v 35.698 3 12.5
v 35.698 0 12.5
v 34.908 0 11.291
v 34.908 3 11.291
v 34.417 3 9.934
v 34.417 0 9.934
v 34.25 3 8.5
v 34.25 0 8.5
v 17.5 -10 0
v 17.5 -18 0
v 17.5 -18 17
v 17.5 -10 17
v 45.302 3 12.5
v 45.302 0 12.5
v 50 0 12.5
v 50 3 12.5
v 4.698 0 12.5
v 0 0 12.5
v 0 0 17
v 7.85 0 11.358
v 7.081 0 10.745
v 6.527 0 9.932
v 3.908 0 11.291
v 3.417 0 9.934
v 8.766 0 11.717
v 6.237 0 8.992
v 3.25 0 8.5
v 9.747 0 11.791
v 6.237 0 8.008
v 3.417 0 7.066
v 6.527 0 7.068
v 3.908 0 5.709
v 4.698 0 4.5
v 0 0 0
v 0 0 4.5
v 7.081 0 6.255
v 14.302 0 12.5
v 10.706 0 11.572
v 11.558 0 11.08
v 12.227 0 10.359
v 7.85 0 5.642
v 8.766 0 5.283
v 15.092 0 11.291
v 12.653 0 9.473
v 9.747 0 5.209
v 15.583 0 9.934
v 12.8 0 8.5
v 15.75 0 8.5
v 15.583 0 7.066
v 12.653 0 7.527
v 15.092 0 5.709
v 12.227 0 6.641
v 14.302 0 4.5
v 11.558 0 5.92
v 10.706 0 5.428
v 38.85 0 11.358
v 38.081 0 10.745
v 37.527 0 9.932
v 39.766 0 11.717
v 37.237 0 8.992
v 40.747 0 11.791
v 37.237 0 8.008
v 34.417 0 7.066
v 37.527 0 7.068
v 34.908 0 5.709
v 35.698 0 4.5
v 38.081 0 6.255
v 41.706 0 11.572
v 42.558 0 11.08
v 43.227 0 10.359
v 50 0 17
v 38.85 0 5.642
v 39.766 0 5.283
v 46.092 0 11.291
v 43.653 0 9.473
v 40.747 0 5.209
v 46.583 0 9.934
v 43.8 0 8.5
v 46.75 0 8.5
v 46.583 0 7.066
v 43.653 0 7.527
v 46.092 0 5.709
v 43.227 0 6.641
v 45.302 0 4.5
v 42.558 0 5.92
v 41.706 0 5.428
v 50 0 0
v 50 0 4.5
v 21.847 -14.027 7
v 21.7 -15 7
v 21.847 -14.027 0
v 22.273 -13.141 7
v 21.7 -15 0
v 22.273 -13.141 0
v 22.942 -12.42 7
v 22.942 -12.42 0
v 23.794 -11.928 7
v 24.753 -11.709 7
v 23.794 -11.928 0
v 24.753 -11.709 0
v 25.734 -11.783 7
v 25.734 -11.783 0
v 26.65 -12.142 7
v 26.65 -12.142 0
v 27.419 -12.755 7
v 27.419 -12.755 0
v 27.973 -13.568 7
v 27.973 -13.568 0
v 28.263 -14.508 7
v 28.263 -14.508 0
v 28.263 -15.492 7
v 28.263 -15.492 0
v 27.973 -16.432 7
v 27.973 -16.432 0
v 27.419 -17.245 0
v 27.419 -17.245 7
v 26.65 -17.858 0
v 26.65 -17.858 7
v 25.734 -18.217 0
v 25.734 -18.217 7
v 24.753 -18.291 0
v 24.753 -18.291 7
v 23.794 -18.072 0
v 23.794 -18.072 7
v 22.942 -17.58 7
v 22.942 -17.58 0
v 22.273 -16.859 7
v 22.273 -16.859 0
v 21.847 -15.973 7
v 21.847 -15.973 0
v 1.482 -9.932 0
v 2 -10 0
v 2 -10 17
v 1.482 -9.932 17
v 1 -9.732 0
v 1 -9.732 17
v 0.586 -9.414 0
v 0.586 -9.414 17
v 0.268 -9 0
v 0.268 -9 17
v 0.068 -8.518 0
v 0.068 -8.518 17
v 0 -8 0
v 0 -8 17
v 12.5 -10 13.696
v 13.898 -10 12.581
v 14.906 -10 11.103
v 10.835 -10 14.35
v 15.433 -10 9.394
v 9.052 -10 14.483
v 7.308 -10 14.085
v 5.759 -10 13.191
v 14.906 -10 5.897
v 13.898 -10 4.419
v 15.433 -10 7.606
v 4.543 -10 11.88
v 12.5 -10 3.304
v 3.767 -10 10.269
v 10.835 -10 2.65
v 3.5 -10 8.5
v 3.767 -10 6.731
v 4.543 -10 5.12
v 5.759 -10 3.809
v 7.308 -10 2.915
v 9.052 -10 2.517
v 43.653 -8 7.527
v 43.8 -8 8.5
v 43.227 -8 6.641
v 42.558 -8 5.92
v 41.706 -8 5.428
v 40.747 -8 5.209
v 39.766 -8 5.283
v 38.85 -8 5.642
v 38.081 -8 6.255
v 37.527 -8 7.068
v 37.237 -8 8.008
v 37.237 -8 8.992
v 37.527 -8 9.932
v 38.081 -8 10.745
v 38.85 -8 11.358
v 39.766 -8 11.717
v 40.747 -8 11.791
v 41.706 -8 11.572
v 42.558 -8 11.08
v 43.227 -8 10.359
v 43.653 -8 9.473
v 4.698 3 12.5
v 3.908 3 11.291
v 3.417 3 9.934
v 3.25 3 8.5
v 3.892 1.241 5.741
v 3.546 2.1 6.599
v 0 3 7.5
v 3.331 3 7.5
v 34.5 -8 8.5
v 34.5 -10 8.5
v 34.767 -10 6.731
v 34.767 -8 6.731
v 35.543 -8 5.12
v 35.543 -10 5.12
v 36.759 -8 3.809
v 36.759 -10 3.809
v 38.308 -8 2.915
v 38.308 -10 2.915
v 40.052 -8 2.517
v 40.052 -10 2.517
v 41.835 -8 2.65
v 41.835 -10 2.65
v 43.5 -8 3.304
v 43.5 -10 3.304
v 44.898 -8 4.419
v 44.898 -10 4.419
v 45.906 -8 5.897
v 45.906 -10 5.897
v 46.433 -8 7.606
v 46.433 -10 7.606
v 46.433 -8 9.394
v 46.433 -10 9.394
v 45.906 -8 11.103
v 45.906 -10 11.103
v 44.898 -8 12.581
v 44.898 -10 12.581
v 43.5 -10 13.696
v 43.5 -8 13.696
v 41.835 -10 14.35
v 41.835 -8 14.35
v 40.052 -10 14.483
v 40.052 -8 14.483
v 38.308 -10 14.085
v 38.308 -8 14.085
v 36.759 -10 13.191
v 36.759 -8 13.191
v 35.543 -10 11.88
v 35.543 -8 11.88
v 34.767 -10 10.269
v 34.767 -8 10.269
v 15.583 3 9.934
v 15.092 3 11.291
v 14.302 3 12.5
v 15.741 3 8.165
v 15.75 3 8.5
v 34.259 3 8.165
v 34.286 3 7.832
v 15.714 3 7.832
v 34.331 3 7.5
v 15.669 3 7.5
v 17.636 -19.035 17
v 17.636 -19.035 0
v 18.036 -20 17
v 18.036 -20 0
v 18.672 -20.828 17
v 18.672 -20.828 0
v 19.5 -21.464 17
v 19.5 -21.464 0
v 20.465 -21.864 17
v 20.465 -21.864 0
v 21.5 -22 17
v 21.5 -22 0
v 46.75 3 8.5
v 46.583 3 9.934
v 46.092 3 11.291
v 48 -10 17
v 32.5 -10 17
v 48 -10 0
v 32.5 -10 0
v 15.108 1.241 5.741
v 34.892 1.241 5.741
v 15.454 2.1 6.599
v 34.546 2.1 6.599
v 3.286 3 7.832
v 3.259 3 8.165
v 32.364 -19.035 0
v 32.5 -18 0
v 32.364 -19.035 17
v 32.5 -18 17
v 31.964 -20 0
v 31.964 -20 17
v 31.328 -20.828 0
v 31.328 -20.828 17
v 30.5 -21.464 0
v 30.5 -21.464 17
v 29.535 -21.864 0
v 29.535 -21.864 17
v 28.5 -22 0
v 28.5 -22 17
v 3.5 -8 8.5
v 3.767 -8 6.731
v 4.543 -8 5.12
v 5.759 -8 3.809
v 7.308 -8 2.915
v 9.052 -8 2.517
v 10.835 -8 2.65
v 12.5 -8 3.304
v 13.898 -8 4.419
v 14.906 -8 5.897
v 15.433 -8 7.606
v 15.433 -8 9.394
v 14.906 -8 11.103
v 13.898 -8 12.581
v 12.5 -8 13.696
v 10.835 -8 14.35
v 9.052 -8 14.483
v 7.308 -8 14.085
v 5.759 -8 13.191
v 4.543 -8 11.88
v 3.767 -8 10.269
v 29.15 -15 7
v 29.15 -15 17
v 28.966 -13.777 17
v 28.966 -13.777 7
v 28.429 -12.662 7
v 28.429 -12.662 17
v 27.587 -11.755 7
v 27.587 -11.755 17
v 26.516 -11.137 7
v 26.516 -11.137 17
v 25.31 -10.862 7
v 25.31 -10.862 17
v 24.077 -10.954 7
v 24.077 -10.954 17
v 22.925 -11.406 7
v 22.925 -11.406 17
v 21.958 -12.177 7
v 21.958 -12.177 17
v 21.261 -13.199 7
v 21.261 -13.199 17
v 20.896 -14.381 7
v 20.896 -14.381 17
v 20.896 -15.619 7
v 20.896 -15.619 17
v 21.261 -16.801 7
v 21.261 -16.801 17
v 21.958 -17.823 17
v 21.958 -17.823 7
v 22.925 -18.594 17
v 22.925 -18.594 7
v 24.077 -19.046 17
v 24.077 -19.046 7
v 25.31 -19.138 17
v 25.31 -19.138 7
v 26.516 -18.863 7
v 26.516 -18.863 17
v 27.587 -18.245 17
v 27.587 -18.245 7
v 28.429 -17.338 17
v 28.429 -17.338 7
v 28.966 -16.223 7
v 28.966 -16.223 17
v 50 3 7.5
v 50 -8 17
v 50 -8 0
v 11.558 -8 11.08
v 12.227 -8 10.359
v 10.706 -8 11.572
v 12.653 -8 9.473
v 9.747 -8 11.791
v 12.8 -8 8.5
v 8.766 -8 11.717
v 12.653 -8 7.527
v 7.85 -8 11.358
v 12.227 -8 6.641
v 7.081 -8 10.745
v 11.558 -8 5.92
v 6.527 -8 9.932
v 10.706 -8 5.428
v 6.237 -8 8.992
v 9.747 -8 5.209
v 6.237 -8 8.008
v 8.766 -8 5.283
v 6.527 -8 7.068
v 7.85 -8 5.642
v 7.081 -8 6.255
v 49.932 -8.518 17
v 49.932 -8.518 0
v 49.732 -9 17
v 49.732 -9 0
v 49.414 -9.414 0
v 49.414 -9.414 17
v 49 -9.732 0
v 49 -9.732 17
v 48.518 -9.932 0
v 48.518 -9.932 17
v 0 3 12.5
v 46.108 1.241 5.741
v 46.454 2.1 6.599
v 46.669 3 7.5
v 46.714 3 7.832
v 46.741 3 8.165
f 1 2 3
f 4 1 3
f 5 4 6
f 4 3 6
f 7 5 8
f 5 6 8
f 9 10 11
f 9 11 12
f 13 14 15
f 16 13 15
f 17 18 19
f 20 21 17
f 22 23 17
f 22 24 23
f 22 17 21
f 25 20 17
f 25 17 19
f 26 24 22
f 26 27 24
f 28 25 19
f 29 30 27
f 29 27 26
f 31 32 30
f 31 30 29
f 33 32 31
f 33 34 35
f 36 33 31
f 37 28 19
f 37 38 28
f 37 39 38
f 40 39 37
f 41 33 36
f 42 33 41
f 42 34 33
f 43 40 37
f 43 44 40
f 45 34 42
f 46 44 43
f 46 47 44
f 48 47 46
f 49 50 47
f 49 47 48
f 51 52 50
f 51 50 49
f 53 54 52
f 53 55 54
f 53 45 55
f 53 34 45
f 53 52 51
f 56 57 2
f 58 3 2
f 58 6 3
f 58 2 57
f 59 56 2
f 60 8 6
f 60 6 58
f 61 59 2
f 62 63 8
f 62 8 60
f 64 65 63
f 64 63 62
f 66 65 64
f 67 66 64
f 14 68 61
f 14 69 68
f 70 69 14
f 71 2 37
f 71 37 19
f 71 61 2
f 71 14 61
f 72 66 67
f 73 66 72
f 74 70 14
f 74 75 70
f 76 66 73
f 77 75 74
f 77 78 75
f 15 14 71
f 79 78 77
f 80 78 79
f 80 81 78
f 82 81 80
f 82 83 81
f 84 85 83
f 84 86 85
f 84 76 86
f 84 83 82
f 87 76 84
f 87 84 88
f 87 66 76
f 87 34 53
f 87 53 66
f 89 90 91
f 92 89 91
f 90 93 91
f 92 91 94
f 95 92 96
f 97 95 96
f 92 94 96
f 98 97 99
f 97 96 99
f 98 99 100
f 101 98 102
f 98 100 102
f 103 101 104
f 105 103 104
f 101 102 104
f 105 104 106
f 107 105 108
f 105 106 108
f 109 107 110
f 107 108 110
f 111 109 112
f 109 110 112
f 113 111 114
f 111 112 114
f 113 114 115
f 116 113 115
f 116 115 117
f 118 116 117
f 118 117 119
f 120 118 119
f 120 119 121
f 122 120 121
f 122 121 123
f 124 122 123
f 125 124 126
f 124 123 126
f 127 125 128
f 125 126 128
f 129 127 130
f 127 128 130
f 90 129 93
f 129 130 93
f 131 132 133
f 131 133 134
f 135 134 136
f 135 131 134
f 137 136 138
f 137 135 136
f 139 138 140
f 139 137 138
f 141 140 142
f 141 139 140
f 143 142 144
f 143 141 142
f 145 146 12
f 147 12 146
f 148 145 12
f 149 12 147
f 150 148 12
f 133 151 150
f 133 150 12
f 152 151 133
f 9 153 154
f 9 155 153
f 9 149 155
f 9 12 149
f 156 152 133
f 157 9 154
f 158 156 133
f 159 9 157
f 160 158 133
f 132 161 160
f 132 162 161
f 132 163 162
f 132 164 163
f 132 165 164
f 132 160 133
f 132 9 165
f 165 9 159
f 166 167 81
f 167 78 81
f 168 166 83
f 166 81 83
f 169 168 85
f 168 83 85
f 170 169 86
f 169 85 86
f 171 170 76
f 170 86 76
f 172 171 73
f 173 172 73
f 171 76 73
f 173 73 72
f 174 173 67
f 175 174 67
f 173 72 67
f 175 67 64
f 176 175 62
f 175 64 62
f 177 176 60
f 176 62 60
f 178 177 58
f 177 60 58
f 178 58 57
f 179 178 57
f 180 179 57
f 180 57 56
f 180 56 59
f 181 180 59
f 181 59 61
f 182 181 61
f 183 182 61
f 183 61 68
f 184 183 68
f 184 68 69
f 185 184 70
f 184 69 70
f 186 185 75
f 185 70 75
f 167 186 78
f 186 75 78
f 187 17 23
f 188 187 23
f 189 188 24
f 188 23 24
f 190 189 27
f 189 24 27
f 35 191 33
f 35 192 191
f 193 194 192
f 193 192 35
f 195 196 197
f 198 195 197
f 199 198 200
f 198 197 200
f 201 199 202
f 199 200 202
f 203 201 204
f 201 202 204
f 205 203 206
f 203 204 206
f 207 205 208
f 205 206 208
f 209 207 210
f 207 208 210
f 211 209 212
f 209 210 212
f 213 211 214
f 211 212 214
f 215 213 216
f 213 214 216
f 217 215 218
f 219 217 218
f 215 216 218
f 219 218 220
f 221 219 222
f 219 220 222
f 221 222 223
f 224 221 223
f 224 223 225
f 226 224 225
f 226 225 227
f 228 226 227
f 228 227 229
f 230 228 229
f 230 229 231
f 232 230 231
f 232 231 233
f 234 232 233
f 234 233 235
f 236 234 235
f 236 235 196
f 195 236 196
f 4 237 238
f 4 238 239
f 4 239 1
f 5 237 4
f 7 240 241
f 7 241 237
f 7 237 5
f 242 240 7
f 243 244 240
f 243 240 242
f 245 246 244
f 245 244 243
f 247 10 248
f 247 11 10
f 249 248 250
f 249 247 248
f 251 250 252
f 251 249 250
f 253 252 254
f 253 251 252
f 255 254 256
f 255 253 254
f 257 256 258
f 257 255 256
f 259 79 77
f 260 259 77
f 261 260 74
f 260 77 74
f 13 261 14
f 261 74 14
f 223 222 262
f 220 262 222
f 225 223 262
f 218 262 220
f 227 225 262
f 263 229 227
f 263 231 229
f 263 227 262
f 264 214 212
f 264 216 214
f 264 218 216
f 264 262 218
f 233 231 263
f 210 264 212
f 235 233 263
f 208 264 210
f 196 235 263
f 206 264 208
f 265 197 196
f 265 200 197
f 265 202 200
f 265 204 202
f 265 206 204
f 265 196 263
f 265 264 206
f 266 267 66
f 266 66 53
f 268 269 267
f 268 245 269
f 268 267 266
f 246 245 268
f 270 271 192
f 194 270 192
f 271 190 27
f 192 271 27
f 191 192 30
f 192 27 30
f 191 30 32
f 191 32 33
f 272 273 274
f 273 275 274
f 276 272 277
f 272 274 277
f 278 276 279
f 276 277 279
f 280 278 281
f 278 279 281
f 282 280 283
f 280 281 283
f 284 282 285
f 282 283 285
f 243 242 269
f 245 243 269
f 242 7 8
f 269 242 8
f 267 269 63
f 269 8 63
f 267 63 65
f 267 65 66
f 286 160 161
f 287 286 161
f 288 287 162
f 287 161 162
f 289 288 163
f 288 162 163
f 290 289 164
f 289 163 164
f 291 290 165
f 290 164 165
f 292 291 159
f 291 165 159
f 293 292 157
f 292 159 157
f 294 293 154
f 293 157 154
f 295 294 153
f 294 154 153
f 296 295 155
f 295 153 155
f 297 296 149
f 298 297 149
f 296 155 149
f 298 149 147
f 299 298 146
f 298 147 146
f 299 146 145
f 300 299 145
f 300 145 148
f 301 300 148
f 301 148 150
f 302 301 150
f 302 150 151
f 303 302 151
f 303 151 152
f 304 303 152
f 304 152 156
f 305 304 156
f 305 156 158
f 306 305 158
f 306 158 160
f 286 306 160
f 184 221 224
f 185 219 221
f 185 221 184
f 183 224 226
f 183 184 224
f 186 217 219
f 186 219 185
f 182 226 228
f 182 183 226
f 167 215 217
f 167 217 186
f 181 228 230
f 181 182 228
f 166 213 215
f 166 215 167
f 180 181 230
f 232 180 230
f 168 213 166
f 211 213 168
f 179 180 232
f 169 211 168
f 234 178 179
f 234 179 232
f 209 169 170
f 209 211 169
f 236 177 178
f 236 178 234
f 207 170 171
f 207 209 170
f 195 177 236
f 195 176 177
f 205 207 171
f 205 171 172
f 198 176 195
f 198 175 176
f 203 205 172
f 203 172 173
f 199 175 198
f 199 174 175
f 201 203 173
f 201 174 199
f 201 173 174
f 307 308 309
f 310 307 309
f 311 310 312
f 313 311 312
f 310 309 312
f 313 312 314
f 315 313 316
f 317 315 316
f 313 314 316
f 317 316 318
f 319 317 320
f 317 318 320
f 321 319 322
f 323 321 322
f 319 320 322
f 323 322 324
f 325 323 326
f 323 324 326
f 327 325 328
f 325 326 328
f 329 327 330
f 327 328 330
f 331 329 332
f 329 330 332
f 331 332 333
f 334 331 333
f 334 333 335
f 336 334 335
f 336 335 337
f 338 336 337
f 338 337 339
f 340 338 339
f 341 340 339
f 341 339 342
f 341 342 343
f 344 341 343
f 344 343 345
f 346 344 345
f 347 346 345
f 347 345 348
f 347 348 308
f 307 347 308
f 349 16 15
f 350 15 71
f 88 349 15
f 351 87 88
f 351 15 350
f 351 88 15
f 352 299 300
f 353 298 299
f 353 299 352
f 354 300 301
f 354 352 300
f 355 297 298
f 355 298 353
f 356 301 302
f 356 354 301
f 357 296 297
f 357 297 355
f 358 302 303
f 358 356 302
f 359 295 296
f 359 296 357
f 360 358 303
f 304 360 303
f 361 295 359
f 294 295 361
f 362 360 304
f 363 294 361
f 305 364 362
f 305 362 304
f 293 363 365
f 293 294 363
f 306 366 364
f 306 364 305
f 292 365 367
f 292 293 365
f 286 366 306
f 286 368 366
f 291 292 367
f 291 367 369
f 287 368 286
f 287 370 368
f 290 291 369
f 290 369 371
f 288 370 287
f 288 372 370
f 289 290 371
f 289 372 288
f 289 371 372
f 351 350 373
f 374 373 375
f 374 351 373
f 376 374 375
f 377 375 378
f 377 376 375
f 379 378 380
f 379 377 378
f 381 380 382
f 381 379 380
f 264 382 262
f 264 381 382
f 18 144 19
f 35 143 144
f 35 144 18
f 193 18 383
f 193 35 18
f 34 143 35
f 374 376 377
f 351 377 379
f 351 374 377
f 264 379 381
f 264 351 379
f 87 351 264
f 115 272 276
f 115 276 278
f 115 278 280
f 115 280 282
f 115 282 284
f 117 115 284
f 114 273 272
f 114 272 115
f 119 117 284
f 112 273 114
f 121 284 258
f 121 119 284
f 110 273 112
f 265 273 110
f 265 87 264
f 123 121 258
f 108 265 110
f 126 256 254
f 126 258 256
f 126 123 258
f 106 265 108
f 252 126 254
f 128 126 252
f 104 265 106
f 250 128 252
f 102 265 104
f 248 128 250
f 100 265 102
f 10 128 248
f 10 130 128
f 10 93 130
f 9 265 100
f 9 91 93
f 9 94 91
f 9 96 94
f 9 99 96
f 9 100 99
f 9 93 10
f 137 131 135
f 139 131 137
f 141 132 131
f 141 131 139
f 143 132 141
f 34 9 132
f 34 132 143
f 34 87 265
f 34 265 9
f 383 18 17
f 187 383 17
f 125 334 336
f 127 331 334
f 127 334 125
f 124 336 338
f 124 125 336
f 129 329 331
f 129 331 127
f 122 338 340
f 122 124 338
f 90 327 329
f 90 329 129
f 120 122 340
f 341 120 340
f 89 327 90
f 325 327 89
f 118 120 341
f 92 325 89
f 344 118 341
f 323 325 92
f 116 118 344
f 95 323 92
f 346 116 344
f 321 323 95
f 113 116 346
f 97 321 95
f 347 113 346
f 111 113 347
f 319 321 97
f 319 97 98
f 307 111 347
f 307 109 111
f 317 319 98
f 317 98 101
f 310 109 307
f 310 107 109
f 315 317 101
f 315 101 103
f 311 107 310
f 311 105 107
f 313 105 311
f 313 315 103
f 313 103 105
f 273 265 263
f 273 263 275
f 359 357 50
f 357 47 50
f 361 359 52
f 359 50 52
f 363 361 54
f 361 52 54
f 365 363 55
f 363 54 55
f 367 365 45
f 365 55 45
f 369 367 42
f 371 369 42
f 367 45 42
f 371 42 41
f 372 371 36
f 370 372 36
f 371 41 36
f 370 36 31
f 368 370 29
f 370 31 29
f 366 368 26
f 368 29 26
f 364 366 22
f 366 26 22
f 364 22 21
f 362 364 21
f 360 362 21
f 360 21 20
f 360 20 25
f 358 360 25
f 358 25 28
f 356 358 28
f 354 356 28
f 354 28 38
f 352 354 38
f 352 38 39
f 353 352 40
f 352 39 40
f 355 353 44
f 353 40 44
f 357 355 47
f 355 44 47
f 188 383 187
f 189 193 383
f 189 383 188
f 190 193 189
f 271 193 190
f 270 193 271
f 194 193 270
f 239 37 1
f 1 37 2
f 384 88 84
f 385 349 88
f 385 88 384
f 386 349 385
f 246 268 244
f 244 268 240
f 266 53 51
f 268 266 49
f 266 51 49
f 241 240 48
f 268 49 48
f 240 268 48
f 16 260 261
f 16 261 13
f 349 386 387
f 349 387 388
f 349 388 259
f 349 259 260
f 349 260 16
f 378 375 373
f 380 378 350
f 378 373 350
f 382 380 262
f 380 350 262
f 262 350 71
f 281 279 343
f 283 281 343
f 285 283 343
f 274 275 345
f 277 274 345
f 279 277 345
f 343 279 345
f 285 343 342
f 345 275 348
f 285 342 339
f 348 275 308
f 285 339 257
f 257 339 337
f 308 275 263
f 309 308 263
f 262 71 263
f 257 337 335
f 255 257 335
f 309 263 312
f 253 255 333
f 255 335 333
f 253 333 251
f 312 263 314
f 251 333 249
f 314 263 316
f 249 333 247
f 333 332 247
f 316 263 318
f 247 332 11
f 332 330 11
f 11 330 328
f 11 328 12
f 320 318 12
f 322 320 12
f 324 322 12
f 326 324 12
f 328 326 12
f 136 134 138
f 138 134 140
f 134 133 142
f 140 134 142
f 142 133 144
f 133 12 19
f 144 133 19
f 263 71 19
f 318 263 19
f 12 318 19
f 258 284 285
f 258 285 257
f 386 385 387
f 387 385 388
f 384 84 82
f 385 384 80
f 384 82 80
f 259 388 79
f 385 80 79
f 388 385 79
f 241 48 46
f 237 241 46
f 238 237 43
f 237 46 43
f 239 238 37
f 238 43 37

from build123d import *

# Parameters (mm, degrees)
P_IDAT_VYSUNUT_M1_DEPTH                           = 17
V_LCOV_ZAHLOUBEN_PRO_M6_ROUBY_S_HLAVO_D           = 6.6
V_LCOV_ZAHLOUBEN_PRO_M6_ROUBY_S_HLAVO_CBORE_D     = 8.3
V_LCOV_ZAHLOUBEN_PRO_M6_ROUBY_S_HLAVO_CBORE_DEPTH = 10
V_LCOV_ZAHLOUBEN_PRO_M6_ROUBY_S_H_2_D             = 6.6
V_LCOV_ZAHLOUBEN_PRO_M6_ROUBY_S_H_2_CBORE_D       = 12
V_LCOV_ZAHLOUBEN_PRO_M6_ROUBY_S_H_2_CBORE_DEPTH   = 2
ZAOBLIT1_R                                        = 4
P_IDAT_VYSUNUT_M4_DEPTH                           = 3
ZKOSEN_1_SIZE                                     = 3


with BuildPart() as part:
    # Skica1 → Přidat vysunutím1 (new body)
    with BuildSketch(Plane.XY):
        with BuildLine():
            Line((0, 0), (50, 0))
            Line((50, 0), (50, -8))
            ThreePointArc((50, -8), (49.414213562, -9.414213562), (48, -10))
            Line((48, -10), (32.5, -10))
            Line((32.5, -10), (32.5, -22))
            Line((32.5, -22), (17.5, -22))
            Line((17.5, -22), (17.5, -10))
            Line((17.5, -10), (2, -10))
            ThreePointArc((2, -10), (0.585786438, -9.414213562), (0, -8))
            Line((0, -8), (0, 0))
        make_face()
    extrude(amount=P_IDAT_VYSUNUT_M1_DEPTH)

    # V_lcov_ zahlouben_ pro M6 _rouby s hlavo (through all)
    with Locations(Plane.XY.offset(17)):
        with Locations((25, -15)):
            CounterBoreHole(V_LCOV_ZAHLOUBEN_PRO_M6_ROUBY_S_HLAVO_D / 2, V_LCOV_ZAHLOUBEN_PRO_M6_ROUBY_S_HLAVO_CBORE_D / 2, V_LCOV_ZAHLOUBEN_PRO_M6_ROUBY_S_HLAVO_CBORE_DEPTH)

    # V_lcov_ zahlouben_ pro M6 _rouby s h 2 (through all)
    with Locations(Plane(origin=(0, -10, 0), x_dir=(-1, 0, 0), z_dir=(0, -1, 0))):
        with Locations((-9.5, -8.5), (-40.5, -8.5)):
            CounterBoreHole(V_LCOV_ZAHLOUBEN_PRO_M6_ROUBY_S_H_2_D / 2, V_LCOV_ZAHLOUBEN_PRO_M6_ROUBY_S_H_2_CBORE_D / 2, V_LCOV_ZAHLOUBEN_PRO_M6_ROUBY_S_H_2_CBORE_DEPTH)

    # Zaoblit1
    zaoblit1_edges = [part.edges().sort_by_distance(p)[0] for p in [
        (32.5, -22, 8.5),
        (17.5, -22, 8.5),
    ]]
    fillet(zaoblit1_edges, radius=ZAOBLIT1_R)

    # Skica10 → Přidat vysunutím4 (add)
    with BuildSketch(Plane(origin=(0, 0, 0), x_dir=(1, 0, 0), z_dir=(0, 1, 0))):
        with BuildLine():
            Line((15.75, -8.5), (34.25, -8.5))
            ThreePointArc((34.25, -8.5), (34.623047352, -6.373047352), (35.697656822, -4.5))
            Line((35.697656822, -4.5), (14.302343178, -4.5))
            ThreePointArc((14.302343178, -4.5), (15.376952648, -6.373047352), (15.75, -8.5))
        make_face()
        with BuildLine():
            ThreePointArc((35.697656822, -12.5), (34.623047352, -10.626952648), (34.25, -8.5))
            Line((34.25, -8.5), (15.75, -8.5))
            ThreePointArc((15.75, -8.5), (15.376952648, -10.626952648), (14.302343178, -12.5))
            Line((14.302343178, -12.5), (35.697656822, -12.5))
        make_face()
        with BuildLine():
            ThreePointArc((4.697656822, -12.5), (3.623047352, -10.626952648), (3.25, -8.5))
            Line((3.25, -8.5), (0, -8.5))
            Line((0, -8.5), (0, -12.5))
            Line((0, -12.5), (4.697656822, -12.5))
        make_face()
        with BuildLine():
            Line((0, -8.5), (3.25, -8.5))
            ThreePointArc((3.25, -8.5), (3.623047352, -6.373047352), (4.697656822, -4.5))
            Line((4.697656822, -4.5), (0, -4.5))
            Line((0, -4.5), (0, -8.5))
        make_face()
        with BuildLine():
            Line((46.75, -8.5), (50, -8.5))
            Line((50, -8.5), (50, -4.5))
            Line((50, -4.5), (45.302343178, -4.5))
            ThreePointArc((45.302343178, -4.5), (46.376952648, -6.373047352), (46.75, -8.5))
        make_face()
        with BuildLine():
            Line((50, -12.5), (50, -8.5))
            Line((50, -8.5), (46.75, -8.5))
            ThreePointArc((46.75, -8.5), (46.376952648, -10.626952648), (45.302343178, -12.5))
            Line((45.302343178, -12.5), (50, -12.5))
        make_face()
    extrude(amount=P_IDAT_VYSUNUT_M4_DEPTH)

    # Zkosení1
    zkosen_1_edges = [part.edges().sort_by_distance(p)[0] for p in [
        (25, 3, 4.5),
        (2.348828411, 3, 4.5),
        (47.651171589, 3, 4.5),
    ]]
    chamfer(zkosen_1_edges, length=ZKOSEN_1_SIZE - 0.0001)  # a hair under: the kernel refuses the full size


solid = part.part
